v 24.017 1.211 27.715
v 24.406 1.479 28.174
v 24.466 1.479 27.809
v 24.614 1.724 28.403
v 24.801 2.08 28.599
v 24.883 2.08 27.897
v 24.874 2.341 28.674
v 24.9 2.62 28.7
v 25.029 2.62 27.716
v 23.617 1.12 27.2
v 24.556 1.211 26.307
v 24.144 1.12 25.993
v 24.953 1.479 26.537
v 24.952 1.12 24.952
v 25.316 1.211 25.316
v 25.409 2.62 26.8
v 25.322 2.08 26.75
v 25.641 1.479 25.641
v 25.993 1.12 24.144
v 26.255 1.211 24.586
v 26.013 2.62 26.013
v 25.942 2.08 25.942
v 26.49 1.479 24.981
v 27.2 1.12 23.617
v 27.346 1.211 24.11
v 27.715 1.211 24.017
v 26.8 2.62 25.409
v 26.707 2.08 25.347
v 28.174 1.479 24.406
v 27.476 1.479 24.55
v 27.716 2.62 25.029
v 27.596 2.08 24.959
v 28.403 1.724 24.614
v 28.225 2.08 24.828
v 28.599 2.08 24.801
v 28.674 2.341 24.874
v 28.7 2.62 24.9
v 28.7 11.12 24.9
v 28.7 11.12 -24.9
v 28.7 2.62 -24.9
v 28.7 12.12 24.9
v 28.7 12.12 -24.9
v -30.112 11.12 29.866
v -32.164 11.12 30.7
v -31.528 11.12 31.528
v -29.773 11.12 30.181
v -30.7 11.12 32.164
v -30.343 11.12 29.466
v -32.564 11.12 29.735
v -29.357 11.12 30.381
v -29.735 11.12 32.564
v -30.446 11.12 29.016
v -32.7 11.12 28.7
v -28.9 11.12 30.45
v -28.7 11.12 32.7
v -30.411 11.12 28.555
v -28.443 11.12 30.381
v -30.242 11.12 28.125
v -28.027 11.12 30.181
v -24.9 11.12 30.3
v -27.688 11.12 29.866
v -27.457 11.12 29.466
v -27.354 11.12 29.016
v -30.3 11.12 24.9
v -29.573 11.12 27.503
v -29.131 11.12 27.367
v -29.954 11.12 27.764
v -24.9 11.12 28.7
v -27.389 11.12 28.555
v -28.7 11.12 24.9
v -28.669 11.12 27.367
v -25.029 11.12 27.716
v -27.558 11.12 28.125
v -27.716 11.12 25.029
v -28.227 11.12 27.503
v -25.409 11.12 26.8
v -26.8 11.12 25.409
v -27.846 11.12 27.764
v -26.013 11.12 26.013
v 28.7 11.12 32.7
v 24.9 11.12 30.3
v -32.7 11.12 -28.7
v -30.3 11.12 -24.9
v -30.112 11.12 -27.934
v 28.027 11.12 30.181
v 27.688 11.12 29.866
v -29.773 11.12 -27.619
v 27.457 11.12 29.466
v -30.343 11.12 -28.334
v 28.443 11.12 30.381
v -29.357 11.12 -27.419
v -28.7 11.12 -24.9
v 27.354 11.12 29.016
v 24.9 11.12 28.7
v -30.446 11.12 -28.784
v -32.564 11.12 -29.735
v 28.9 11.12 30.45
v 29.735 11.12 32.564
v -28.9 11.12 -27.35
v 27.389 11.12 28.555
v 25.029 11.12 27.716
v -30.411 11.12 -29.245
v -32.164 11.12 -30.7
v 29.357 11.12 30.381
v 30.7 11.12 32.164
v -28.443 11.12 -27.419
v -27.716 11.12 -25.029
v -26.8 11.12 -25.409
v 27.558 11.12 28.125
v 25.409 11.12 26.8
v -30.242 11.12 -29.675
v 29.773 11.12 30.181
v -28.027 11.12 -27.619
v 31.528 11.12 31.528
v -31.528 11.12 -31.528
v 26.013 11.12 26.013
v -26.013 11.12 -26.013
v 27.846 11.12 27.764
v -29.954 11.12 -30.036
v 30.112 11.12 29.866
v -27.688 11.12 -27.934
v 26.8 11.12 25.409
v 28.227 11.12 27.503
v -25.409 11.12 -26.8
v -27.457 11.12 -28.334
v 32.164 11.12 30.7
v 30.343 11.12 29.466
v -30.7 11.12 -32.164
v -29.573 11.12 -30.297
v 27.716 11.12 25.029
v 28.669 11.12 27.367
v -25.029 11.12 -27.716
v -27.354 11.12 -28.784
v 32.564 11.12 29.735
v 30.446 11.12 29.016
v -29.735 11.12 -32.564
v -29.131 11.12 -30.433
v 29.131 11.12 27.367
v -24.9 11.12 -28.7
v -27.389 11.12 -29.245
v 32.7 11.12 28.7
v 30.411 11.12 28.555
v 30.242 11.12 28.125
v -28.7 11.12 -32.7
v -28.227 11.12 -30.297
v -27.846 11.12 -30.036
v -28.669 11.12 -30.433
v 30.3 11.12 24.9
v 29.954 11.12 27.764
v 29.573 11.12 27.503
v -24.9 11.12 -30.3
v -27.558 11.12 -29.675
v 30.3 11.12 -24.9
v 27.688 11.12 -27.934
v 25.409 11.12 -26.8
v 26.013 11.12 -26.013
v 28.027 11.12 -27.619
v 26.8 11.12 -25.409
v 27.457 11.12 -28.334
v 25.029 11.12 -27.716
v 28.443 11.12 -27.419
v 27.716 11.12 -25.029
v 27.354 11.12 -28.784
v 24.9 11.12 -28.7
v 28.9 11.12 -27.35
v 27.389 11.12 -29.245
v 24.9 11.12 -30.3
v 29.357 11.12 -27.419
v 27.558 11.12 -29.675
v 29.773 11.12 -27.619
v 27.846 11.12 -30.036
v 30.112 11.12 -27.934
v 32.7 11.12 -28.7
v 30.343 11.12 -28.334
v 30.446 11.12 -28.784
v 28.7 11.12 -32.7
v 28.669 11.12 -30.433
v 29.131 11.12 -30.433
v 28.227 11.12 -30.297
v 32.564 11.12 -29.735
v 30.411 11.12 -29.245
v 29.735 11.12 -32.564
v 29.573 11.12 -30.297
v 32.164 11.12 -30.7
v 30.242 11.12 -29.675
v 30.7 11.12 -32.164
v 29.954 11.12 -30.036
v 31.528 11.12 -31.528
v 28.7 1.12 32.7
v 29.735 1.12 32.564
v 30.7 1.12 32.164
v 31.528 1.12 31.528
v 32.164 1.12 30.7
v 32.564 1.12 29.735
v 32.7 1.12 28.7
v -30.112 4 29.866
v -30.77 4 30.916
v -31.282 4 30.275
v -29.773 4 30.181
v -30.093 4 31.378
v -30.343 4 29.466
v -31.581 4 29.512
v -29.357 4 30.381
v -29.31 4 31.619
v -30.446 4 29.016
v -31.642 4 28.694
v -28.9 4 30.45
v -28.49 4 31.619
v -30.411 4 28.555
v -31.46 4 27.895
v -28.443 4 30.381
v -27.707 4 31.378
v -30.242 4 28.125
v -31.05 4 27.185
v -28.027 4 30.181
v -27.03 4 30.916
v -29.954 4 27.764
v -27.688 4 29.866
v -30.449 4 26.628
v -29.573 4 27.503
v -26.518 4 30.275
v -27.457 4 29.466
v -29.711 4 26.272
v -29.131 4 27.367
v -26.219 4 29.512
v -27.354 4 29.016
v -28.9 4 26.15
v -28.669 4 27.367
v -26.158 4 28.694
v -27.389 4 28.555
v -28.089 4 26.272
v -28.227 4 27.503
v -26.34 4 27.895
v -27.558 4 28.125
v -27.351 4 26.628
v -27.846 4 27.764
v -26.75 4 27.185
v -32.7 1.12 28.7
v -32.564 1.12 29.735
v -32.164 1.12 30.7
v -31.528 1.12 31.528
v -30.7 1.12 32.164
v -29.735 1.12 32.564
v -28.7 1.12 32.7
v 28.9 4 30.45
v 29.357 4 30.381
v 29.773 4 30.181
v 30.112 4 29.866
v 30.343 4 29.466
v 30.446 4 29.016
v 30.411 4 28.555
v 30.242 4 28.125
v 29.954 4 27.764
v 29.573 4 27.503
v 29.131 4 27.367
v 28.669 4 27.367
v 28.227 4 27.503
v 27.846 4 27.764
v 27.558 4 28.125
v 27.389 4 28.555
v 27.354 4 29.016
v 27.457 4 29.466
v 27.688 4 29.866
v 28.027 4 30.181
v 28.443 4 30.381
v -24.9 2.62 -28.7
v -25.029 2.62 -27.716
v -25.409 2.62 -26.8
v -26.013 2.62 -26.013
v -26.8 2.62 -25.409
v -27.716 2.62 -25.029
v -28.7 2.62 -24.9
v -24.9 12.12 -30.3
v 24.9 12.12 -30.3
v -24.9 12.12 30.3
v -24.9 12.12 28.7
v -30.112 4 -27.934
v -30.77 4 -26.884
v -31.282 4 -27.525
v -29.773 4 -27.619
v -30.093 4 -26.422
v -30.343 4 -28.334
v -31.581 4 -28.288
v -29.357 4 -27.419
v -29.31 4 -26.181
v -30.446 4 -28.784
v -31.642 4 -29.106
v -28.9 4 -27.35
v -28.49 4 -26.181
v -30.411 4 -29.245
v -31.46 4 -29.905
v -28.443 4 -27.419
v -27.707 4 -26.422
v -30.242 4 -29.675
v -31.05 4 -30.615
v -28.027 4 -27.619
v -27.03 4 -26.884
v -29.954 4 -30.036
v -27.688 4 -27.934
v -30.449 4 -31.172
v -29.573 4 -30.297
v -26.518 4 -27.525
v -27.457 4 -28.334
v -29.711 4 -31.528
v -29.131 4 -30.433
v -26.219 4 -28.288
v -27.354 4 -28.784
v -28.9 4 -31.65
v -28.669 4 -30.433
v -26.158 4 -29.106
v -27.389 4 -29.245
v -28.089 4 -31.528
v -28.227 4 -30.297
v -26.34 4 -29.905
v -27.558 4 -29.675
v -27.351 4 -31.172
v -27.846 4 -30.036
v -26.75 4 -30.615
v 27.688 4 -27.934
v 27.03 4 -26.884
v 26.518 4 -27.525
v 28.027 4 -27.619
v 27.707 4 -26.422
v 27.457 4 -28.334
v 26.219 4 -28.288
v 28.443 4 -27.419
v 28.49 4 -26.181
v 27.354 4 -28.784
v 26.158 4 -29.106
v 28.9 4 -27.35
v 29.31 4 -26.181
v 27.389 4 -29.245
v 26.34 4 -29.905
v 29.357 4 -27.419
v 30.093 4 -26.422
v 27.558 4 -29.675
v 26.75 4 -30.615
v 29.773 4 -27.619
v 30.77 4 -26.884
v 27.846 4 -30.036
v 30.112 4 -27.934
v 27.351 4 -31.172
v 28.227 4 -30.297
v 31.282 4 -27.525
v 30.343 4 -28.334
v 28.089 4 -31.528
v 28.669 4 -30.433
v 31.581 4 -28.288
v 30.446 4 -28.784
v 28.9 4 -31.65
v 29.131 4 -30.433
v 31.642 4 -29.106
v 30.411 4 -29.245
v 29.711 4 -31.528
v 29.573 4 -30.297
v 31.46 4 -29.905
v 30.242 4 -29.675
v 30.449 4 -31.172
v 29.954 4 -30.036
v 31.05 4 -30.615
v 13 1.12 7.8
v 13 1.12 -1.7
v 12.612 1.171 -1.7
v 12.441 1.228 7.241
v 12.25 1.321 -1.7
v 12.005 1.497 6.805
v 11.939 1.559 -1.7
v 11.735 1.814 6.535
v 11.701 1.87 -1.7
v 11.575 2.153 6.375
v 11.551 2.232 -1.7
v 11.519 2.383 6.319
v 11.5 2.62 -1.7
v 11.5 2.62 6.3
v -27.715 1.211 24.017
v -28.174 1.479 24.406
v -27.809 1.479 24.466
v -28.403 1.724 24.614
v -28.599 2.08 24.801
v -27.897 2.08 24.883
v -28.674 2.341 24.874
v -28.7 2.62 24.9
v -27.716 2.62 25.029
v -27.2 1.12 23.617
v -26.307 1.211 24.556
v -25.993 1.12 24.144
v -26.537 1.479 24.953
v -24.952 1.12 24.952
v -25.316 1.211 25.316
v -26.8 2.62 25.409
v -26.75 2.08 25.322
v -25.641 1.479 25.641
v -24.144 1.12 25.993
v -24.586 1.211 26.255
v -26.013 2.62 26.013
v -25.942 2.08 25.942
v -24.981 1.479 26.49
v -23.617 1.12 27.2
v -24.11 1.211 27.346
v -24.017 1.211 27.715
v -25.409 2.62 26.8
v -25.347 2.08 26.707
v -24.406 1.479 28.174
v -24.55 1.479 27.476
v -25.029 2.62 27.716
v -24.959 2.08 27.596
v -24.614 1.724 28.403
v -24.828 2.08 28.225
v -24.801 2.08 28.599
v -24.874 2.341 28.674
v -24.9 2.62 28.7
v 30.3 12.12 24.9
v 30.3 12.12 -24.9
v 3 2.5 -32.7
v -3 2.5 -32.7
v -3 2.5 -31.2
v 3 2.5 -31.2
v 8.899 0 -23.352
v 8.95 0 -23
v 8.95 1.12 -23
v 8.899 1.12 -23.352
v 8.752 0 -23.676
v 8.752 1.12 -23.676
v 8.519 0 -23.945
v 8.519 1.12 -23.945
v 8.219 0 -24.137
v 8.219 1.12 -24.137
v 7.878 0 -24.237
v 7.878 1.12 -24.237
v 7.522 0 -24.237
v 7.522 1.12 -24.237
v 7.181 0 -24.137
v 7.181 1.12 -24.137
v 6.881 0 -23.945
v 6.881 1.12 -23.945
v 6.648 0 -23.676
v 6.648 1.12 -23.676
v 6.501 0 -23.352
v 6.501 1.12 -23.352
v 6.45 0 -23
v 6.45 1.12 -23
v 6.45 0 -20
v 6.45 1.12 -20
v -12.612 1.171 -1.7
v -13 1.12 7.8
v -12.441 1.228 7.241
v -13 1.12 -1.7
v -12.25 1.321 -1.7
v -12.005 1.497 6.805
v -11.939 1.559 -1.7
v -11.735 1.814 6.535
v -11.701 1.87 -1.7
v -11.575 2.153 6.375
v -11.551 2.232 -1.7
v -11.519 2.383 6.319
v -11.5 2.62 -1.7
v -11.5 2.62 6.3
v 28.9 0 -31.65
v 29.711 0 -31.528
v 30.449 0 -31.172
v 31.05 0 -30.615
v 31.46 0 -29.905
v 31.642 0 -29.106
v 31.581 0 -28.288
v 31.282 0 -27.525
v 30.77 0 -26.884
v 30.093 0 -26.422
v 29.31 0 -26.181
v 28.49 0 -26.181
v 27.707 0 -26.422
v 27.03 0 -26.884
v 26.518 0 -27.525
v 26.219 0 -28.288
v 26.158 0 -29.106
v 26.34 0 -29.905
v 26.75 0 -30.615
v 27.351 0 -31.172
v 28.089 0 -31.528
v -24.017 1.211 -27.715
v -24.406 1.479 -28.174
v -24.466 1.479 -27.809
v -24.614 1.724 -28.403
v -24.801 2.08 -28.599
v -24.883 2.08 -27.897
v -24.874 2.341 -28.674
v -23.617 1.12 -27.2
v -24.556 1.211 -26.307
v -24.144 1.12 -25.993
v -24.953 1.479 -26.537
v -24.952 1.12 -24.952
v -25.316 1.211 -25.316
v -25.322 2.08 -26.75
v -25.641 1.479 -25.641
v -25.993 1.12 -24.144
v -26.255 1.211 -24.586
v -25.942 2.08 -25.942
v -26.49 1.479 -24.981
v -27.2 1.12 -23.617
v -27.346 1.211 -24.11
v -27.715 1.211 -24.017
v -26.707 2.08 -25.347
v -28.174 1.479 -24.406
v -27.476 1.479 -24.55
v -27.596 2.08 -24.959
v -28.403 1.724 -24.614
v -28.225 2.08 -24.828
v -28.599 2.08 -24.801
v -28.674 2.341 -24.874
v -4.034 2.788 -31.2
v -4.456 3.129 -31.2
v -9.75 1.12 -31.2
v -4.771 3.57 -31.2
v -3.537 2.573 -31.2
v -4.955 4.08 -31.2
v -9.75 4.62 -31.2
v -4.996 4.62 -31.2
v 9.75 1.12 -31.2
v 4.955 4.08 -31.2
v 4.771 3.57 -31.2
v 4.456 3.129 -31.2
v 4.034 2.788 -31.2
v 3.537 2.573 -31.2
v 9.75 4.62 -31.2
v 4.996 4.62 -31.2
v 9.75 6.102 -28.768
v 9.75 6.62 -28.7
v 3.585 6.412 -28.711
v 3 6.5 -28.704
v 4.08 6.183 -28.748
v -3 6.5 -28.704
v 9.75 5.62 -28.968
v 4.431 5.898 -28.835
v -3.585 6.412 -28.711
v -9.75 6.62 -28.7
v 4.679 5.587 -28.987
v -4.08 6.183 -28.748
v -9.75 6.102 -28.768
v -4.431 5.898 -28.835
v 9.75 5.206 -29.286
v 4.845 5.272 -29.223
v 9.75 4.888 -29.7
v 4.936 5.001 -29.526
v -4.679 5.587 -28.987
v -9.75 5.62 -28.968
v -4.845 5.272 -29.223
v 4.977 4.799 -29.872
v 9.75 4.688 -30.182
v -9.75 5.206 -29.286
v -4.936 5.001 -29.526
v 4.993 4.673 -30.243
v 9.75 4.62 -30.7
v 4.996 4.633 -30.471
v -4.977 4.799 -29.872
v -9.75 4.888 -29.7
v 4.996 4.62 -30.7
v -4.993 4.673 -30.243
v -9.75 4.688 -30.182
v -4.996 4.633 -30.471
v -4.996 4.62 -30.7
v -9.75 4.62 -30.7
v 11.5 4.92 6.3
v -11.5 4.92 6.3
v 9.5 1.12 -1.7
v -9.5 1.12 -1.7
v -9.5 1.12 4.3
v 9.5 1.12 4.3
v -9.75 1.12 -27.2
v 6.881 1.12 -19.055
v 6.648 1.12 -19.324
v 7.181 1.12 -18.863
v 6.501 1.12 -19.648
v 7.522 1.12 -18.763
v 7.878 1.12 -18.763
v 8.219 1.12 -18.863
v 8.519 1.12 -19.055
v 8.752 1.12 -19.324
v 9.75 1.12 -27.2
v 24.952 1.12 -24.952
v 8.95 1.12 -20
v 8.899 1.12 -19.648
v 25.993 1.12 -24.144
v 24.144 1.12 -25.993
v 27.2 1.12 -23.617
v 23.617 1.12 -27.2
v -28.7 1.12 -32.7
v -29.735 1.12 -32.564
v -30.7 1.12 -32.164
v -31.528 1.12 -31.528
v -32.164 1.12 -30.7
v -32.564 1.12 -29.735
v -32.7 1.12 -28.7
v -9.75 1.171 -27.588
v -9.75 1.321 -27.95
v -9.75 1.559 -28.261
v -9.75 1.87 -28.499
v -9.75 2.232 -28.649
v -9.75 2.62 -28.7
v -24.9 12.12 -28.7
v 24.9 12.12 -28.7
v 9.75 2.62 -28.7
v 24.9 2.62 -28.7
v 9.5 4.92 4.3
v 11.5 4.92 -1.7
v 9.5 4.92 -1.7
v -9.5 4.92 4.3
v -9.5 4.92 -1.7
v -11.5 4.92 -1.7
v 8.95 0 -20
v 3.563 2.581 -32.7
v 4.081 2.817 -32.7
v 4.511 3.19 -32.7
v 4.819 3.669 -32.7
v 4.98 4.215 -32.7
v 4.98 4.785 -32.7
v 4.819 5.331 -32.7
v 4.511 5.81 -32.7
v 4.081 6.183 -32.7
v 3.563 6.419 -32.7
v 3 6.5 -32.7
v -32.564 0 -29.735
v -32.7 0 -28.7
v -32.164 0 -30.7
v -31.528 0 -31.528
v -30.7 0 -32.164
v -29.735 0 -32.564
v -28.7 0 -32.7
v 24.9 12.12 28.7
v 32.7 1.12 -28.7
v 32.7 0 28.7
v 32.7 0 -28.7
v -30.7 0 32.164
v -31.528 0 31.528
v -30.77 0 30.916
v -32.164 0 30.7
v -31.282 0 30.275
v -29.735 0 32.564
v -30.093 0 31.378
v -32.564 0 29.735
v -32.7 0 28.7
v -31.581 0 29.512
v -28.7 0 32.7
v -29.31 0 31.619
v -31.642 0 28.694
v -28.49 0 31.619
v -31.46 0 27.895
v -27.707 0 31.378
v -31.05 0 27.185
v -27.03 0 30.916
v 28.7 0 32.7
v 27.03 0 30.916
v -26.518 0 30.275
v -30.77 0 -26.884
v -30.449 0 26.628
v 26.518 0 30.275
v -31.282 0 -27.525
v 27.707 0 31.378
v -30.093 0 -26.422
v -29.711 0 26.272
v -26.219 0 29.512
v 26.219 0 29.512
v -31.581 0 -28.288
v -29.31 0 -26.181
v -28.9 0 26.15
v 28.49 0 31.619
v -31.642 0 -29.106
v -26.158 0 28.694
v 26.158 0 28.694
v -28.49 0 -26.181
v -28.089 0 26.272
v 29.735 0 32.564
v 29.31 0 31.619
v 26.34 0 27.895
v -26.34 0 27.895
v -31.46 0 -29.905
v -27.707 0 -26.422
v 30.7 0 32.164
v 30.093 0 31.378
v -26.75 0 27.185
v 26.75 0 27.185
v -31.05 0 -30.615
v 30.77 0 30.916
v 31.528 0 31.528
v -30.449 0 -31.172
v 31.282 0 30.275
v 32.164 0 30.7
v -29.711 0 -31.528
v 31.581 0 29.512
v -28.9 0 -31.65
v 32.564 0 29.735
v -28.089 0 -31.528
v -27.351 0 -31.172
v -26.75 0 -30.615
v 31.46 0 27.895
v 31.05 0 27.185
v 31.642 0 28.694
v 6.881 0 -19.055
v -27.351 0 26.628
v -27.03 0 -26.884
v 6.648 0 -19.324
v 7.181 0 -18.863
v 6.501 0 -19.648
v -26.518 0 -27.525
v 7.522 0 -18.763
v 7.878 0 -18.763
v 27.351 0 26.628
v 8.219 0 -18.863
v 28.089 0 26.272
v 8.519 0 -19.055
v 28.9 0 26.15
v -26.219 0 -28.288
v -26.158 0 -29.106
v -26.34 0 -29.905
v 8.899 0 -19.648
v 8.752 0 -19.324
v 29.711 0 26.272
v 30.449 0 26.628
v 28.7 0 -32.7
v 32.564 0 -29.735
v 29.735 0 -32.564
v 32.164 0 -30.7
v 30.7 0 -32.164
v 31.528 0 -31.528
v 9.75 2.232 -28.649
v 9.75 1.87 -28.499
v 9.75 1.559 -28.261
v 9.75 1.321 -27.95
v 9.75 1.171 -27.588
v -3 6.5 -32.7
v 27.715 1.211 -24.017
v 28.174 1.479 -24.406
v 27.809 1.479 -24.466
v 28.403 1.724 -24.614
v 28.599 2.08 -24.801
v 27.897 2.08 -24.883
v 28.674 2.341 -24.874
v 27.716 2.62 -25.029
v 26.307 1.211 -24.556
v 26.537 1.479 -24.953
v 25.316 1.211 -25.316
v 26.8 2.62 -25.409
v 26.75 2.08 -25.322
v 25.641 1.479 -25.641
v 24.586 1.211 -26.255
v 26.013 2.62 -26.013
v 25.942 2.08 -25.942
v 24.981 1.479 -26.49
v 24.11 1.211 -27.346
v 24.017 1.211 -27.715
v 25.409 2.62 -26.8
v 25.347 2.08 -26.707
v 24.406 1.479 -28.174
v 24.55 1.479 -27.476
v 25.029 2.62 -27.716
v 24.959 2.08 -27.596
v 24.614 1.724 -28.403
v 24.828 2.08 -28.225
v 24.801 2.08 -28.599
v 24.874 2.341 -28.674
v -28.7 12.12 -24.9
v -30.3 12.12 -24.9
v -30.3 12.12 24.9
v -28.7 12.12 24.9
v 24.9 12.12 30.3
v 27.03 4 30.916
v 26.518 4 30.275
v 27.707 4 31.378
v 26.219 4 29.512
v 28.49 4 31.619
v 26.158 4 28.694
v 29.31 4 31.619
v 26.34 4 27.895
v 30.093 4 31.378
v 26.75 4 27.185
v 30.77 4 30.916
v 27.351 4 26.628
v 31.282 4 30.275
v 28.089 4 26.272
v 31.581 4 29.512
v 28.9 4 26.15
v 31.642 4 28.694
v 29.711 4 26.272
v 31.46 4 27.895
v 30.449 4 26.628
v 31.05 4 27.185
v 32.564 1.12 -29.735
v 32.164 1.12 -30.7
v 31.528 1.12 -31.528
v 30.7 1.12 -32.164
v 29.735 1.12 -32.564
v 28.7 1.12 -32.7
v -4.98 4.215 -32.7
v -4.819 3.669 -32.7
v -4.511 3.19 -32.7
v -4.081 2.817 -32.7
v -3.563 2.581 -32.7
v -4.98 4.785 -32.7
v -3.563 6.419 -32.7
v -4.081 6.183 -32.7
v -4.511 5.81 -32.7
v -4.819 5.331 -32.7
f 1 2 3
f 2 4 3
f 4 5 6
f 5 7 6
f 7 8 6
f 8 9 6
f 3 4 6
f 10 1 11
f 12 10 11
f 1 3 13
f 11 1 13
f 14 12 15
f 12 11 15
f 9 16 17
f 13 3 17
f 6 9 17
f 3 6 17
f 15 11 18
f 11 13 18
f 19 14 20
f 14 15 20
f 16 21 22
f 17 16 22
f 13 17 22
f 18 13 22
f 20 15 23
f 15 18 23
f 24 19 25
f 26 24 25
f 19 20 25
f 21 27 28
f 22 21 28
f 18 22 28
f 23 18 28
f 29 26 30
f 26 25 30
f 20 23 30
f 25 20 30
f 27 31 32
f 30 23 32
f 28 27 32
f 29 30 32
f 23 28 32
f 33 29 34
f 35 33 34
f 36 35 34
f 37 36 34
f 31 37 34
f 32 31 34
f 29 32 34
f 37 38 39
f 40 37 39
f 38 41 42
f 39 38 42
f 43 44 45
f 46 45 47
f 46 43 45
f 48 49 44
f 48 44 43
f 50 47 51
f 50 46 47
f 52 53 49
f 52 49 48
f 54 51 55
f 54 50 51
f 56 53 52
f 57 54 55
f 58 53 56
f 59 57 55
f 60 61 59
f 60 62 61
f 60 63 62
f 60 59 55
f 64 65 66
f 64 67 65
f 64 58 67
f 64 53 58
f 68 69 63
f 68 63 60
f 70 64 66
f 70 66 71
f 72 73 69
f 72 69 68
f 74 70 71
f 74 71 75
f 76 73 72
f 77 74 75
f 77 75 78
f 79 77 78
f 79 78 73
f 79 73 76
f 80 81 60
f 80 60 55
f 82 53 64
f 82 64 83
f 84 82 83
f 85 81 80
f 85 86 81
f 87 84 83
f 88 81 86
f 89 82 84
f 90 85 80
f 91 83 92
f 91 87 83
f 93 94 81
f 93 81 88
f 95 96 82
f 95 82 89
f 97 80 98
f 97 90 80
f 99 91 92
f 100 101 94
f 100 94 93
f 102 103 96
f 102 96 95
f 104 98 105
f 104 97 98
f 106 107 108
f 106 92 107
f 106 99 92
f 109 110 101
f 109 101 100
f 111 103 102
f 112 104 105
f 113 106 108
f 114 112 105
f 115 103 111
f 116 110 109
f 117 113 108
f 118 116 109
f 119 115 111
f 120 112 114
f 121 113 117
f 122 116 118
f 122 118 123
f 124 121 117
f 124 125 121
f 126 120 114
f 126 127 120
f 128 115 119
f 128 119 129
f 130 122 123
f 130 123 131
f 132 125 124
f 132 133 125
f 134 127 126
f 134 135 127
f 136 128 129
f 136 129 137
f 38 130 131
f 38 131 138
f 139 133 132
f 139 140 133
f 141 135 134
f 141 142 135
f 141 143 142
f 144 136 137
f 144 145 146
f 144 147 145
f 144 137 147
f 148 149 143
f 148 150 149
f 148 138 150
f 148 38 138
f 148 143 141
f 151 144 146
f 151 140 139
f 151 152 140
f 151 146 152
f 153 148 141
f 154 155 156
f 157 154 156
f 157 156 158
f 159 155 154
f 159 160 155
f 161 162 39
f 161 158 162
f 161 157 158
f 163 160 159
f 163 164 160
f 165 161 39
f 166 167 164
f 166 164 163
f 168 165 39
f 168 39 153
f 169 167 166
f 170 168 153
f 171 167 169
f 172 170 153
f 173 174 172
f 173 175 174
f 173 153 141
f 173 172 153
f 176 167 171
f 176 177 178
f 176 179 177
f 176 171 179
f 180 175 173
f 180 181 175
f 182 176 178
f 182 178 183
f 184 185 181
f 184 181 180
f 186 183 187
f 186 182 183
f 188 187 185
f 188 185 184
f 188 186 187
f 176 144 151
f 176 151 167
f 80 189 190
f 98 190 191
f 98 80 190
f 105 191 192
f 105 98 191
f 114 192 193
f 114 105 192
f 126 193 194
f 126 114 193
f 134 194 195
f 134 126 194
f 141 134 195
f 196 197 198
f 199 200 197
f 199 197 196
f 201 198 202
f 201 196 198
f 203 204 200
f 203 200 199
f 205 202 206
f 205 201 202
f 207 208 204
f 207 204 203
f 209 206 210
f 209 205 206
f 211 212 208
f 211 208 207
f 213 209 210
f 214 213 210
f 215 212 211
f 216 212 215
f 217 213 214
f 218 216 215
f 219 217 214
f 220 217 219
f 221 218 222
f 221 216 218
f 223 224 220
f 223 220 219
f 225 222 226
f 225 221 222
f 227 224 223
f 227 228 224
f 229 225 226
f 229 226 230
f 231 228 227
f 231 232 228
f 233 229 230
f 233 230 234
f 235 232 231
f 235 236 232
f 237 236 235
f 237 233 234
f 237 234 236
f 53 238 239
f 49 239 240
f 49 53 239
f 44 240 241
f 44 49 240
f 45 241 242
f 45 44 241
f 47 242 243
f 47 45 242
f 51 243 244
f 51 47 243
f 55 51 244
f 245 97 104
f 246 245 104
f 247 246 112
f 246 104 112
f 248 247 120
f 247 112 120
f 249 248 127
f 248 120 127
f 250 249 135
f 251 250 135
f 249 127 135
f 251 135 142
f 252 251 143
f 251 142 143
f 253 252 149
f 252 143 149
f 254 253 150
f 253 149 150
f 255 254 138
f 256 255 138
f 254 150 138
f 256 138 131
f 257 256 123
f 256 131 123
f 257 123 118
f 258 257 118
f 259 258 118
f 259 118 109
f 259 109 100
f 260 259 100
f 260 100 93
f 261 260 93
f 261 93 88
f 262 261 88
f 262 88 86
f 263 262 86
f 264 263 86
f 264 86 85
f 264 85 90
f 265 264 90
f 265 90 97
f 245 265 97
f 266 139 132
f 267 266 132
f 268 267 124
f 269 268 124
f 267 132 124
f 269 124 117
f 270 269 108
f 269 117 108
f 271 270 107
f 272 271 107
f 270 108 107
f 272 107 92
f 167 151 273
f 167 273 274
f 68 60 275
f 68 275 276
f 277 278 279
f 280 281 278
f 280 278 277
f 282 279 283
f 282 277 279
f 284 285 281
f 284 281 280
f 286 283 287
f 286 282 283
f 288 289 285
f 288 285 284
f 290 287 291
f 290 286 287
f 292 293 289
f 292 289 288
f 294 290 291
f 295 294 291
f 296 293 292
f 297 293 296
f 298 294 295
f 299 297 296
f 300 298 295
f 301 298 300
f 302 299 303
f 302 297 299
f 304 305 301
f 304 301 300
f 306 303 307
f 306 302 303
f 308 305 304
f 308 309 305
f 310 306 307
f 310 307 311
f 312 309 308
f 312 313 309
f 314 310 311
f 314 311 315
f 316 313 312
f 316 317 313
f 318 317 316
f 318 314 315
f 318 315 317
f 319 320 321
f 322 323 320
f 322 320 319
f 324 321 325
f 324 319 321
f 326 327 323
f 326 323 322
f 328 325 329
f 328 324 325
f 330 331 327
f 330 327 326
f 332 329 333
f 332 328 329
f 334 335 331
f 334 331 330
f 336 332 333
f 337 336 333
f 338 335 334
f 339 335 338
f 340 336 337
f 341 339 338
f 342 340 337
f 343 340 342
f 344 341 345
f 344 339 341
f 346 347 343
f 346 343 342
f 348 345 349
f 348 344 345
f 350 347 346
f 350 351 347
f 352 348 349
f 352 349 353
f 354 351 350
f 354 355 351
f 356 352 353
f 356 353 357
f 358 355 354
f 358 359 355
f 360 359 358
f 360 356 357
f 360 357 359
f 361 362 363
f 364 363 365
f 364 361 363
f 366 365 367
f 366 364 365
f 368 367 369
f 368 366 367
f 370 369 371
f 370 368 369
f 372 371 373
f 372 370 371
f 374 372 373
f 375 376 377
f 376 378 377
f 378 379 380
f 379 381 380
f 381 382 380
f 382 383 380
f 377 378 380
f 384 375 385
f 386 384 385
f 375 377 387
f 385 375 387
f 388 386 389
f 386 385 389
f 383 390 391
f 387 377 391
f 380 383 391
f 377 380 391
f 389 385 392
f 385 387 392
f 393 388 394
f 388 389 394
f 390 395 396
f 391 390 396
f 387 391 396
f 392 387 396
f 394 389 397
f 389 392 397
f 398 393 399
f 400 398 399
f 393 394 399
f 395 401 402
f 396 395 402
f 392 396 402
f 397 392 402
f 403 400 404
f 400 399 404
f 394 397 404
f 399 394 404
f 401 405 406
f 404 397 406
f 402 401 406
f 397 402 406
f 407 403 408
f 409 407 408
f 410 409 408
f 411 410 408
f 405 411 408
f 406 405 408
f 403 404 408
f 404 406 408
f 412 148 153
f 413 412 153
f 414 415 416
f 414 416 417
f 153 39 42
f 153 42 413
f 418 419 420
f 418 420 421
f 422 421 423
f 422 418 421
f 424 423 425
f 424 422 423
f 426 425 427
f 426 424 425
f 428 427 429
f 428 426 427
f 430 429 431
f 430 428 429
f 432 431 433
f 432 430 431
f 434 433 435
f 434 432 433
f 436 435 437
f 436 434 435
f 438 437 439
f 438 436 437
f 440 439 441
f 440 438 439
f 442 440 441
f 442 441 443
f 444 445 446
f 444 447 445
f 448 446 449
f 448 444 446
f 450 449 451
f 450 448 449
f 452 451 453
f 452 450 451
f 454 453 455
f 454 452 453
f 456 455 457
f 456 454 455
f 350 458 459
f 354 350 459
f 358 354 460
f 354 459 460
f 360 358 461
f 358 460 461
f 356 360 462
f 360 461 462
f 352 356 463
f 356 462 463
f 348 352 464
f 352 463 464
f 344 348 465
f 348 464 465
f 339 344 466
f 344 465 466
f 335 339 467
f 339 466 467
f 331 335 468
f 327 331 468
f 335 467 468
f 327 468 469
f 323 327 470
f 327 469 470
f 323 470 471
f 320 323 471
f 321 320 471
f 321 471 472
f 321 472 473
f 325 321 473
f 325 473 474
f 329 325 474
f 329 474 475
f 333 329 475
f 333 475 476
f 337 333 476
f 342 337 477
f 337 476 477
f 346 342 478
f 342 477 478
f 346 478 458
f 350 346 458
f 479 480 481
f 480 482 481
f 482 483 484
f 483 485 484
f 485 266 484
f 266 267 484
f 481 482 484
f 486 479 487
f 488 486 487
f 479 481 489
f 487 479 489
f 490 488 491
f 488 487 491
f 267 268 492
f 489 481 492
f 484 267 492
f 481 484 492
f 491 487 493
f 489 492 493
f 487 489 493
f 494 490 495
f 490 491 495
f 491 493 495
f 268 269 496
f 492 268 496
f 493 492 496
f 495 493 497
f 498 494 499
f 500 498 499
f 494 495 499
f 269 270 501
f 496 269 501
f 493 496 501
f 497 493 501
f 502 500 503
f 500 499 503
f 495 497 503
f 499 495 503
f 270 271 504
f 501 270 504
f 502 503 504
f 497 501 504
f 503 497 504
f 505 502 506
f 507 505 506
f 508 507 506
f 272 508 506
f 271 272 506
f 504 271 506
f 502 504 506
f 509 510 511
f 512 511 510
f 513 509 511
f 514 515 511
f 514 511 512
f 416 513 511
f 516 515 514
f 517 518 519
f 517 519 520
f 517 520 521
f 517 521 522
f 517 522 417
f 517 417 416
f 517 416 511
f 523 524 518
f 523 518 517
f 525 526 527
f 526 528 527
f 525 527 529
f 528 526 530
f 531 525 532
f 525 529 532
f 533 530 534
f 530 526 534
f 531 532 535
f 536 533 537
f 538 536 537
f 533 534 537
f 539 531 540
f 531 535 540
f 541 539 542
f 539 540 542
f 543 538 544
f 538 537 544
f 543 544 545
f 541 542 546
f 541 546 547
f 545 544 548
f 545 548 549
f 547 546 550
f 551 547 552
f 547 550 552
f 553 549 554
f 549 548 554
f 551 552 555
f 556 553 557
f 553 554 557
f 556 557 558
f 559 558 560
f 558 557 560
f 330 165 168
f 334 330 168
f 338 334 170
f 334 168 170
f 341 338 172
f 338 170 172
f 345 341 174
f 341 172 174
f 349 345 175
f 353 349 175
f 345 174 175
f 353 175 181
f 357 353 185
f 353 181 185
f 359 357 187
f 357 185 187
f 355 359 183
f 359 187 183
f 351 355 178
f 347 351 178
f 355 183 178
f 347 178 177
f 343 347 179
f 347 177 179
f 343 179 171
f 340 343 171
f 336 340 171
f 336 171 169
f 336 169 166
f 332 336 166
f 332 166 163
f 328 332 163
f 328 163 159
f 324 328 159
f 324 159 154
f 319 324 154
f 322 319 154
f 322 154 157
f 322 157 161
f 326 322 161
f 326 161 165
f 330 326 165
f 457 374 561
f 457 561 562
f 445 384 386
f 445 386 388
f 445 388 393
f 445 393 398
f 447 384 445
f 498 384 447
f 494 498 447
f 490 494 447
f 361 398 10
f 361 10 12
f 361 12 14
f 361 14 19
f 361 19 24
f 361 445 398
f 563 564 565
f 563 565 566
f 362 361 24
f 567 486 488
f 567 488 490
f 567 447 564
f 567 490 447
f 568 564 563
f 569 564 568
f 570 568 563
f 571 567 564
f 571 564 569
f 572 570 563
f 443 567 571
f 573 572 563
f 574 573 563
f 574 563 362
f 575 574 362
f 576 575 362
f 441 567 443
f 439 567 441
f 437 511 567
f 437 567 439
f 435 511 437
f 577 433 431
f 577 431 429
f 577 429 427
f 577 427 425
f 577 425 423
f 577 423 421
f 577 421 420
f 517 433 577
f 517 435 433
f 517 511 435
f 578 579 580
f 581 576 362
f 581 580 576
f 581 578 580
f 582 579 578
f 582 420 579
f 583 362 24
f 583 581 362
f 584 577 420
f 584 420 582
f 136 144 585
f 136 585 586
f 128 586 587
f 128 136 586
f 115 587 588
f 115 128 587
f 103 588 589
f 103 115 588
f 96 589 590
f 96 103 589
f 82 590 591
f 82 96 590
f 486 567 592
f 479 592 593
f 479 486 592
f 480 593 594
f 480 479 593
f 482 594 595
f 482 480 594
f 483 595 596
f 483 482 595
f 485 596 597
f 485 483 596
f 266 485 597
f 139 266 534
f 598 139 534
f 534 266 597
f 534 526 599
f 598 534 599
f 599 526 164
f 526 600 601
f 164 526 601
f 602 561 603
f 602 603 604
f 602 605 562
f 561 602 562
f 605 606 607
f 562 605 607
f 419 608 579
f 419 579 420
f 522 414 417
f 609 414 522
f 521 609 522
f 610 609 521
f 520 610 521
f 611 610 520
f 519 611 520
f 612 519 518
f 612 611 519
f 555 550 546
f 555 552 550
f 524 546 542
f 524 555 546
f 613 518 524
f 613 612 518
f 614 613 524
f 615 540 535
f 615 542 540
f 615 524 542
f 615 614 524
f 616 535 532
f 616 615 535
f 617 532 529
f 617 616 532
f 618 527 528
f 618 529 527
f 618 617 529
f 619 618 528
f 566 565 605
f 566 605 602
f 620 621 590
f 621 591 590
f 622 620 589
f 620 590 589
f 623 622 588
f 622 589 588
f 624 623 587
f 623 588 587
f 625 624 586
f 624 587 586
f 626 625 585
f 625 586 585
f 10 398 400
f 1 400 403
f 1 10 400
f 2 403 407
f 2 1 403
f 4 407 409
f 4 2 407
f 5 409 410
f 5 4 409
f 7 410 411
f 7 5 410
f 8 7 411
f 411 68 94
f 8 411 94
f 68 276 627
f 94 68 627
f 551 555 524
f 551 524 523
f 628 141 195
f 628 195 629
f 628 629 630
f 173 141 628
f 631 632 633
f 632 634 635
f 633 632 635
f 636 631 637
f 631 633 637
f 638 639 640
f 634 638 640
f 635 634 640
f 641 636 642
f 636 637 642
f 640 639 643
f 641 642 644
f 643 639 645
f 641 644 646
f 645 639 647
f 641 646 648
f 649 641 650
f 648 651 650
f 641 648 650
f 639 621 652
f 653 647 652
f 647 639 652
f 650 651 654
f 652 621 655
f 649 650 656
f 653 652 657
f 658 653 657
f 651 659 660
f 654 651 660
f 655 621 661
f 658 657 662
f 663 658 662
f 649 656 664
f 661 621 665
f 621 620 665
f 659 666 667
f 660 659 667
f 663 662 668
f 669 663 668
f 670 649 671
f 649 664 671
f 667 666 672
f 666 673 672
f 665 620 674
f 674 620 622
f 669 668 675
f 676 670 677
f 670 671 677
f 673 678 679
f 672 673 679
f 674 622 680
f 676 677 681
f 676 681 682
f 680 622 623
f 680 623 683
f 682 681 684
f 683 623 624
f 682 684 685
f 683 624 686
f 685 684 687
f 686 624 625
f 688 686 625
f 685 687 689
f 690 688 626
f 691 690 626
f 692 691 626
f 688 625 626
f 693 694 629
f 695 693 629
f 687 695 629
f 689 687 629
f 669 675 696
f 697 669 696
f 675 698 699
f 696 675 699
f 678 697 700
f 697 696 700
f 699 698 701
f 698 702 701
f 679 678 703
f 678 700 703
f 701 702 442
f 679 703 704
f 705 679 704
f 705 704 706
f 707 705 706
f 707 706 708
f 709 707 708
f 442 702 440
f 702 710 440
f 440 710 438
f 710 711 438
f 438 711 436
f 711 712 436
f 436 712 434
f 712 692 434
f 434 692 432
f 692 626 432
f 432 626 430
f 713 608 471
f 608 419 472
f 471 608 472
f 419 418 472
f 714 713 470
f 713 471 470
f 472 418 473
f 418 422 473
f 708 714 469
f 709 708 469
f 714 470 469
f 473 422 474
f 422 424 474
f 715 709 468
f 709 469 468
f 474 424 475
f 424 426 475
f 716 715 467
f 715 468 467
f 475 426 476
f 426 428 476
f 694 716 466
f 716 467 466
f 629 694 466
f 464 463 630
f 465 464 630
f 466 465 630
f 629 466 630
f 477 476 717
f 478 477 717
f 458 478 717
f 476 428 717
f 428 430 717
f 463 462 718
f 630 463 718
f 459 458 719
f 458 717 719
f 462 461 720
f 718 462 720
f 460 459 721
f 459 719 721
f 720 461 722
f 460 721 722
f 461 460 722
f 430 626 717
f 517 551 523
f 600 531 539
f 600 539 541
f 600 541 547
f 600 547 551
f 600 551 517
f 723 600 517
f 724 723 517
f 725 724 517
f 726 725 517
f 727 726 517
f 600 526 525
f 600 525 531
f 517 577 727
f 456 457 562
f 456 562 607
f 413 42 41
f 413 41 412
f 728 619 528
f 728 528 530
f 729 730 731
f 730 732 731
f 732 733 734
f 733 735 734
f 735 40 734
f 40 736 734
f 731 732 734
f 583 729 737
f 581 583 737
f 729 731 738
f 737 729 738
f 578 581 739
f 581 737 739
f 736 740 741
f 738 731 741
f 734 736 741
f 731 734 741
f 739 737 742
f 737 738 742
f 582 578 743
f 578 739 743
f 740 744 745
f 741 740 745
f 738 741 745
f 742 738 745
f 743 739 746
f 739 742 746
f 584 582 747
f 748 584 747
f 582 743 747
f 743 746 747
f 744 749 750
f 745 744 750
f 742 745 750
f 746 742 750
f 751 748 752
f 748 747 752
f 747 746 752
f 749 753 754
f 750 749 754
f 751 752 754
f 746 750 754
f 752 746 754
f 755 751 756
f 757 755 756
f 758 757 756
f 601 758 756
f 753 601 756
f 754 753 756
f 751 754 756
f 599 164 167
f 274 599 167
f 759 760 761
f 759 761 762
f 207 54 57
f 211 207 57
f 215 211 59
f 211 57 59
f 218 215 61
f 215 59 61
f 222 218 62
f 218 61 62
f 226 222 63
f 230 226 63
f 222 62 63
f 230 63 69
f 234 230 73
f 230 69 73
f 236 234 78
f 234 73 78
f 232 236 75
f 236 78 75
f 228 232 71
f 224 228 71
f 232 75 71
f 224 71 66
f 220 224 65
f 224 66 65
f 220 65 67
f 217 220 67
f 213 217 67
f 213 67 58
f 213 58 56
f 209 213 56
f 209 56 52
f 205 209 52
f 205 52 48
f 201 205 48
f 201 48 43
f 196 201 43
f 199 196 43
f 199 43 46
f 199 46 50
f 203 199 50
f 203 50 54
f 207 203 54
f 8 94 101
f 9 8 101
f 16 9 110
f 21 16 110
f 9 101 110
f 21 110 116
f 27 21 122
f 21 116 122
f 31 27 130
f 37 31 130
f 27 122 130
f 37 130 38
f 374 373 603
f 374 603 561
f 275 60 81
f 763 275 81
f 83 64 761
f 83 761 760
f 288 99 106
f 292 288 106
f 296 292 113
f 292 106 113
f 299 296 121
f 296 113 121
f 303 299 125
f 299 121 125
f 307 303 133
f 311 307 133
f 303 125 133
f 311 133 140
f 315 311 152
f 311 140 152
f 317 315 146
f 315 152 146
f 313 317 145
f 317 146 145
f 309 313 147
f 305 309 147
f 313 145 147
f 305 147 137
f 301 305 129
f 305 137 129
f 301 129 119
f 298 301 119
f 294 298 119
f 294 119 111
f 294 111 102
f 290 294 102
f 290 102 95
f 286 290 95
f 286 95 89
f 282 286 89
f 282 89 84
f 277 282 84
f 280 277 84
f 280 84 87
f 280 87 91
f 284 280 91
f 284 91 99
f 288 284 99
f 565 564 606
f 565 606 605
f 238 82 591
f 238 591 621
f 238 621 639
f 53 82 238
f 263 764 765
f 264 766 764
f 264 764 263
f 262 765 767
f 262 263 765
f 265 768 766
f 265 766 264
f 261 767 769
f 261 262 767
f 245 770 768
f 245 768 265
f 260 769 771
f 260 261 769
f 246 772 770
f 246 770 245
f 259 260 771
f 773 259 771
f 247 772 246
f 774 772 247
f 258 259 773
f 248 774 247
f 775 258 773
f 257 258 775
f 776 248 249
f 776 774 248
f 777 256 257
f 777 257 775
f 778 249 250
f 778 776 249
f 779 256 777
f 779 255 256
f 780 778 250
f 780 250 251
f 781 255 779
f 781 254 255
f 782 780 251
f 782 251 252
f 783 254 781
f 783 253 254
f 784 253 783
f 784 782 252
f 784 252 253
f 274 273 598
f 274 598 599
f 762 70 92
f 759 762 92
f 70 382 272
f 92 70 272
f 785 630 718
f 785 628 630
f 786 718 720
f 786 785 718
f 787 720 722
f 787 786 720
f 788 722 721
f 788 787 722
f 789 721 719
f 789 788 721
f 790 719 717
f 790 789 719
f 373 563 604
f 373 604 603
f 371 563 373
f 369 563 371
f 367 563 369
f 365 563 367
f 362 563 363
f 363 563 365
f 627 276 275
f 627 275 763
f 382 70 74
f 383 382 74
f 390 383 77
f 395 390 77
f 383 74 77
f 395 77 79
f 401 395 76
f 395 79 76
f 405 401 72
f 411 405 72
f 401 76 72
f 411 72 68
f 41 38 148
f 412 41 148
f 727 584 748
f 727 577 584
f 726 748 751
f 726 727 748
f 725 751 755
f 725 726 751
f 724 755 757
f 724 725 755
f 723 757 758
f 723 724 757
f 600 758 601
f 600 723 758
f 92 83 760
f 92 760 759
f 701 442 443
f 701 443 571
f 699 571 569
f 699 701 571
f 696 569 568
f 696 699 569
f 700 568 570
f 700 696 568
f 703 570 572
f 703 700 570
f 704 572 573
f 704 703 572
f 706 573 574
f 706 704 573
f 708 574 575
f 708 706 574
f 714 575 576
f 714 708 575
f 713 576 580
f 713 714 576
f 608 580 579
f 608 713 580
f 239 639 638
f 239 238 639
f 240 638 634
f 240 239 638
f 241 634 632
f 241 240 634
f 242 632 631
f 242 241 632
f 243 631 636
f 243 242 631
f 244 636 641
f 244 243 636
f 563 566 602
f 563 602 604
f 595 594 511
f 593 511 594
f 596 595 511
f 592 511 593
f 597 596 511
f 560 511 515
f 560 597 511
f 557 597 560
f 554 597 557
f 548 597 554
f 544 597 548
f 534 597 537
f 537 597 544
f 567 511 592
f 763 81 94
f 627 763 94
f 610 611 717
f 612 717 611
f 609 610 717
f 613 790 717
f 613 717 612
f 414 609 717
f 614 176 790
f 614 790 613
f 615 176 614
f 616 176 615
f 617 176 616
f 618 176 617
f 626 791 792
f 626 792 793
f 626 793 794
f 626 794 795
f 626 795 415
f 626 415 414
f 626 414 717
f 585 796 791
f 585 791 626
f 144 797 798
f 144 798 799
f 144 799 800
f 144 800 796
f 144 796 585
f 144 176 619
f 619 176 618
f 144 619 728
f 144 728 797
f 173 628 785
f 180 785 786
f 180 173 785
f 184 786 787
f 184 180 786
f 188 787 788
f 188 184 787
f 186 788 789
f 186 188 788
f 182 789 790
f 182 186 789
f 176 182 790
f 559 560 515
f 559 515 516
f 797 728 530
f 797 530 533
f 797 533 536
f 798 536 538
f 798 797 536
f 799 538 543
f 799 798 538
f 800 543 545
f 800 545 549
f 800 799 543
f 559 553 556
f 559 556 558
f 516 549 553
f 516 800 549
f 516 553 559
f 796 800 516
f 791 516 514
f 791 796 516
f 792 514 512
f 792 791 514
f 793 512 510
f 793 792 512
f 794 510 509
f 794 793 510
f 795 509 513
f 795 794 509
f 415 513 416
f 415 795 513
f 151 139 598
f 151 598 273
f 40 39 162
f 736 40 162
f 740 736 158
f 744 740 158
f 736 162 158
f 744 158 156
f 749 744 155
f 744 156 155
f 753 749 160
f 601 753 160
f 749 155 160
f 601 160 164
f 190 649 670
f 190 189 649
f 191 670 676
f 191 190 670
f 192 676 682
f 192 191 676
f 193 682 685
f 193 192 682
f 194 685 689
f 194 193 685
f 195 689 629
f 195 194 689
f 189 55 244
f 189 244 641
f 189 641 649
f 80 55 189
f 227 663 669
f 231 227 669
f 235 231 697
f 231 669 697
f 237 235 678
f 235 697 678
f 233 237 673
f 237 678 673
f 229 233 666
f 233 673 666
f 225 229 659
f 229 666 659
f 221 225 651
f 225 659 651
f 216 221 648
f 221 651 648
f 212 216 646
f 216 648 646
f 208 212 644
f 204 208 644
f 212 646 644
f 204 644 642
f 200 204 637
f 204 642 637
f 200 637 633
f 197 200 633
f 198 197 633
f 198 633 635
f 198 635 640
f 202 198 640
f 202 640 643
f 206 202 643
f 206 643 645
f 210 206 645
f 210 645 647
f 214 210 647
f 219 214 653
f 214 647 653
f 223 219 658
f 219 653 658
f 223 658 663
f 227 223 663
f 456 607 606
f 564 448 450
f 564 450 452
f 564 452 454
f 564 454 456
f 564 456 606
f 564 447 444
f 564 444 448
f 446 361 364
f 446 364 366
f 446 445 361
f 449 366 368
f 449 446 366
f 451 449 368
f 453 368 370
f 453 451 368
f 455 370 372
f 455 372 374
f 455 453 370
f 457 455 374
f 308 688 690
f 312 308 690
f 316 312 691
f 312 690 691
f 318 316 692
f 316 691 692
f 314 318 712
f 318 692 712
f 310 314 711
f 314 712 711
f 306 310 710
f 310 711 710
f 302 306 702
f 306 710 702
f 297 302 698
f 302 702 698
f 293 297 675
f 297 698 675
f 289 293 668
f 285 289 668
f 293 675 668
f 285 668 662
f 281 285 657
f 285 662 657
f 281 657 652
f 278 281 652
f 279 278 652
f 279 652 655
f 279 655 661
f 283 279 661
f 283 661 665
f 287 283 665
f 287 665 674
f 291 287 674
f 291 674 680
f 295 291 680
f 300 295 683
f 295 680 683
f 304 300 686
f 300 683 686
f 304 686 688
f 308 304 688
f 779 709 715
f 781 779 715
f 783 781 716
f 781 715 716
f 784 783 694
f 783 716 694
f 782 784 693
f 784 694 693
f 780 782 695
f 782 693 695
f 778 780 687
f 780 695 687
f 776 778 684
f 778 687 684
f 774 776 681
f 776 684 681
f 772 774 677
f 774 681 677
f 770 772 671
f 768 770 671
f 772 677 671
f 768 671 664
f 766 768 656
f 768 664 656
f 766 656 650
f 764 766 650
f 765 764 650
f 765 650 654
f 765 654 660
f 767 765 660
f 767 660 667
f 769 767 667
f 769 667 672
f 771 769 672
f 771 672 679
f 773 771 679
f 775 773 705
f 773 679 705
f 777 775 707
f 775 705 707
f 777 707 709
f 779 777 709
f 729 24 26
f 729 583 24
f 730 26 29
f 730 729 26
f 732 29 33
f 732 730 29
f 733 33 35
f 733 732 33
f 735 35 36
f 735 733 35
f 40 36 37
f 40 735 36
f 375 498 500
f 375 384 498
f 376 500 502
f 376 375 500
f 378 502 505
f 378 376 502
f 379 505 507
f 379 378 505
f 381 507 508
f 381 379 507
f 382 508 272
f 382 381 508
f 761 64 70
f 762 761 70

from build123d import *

# Parameters (mm, degrees)
SKETCH1_W           = 65.4
SKETCH1_H           = 65.4
BOSS_EXTRUDE1_DEPTH = 1.12
FILLET1_R           = 4
BOSS_EXTRUDE2_START = 10
BOSS_EXTRUDE2_DEPTH = 10
CUT_EXTRUDE1_REACH  = 75.96
SKETCH4_W           = 19.5
SKETCH4_H           = 3.5
CUT_EXTRUDE2_DEPTH  = 2.5
FILLET3_R           = 2
SKETCH5_W           = 1.6
SKETCH5_H           = 49.8
SKETCH5_W_2         = 49.8
SKETCH5_H_2         = 1.6
BOSS_EXTRUDE3_DEPTH = 1
BOSS_EXTRUDE4_DEPTH = 3.8
SKETCH7_R           = 1.55
CUT_EXTRUDE3_DEPTH  = 11.12
SKETCH8_R           = 2.75
CUT_EXTRUDE4_DEPTH  = 4
FILLET4_R           = 1.5
FILLET5_R           = 1.5
CUT_EXTRUDE5_REACH  = 49.807


with BuildPart() as part:
    # Sketch1 → Boss-Extrude1 (new body)
    with BuildSketch(Plane(origin=(0, 0, 0), x_dir=(1, 0, 0), z_dir=(0, 1, 0))):
        Rectangle(SKETCH1_W, SKETCH1_H)
    extrude(amount=BOSS_EXTRUDE1_DEPTH)

    # Fillet1
    fillet1_edges = [part.edges().sort_by_distance(p)[0] for p in [
        (32.7, 0.56, 32.7),
        (-32.7, 0.56, 32.7),
        (-32.7, 0.56, -32.7),
        (32.7, 0.56, -32.7),
    ]]
    fillet(fillet1_edges, radius=FILLET1_R)

    # Sketch2 → Boss-Extrude2 (add)
    with BuildSketch(Plane(origin=(0, 1.12, 0), x_dir=(1, 0, 0), z_dir=(0, 1, 0)).offset(BOSS_EXTRUDE2_START)):
        with BuildLine():
            Line((-32.7, 28.7), (-32.7, -28.7))
            ThreePointArc((-32.7, -28.7), (-31.528427125, -31.528427125), (-28.7, -32.7))
            Line((-28.7, -32.7), (28.7, -32.7))
            ThreePointArc((28.7, -32.7), (31.528427125, -31.528427125), (32.7, -28.7))
            Line((32.7, -28.7), (32.7, 28.7))
            ThreePointArc((32.7, 28.7), (31.528427125, 31.528427125), (28.7, 32.7))
            Line((28.7, 32.7), (-28.7, 32.7))
            ThreePointArc((-28.7, 32.7), (-31.528427125, 31.528427125), (-32.7, 28.7))
        make_face()
        with BuildLine():
            Line((24.9, 28.7), (-24.9, 28.7))
            ThreePointArc((-24.9, 28.7), (-26.012994231, 26.012994231), (-28.7, 24.9))
            Line((-28.7, 24.9), (-28.7, -24.9))
            ThreePointArc((-28.7, -24.9), (-26.012994231, -26.012994231), (-24.9, -28.7))
            Line((-24.9, -28.7), (24.9, -28.7))
            ThreePointArc((24.9, -28.7), (26.012994231, -26.012994231), (28.7, -24.9))
            Line((28.7, -24.9), (28.7, 24.9))
            ThreePointArc((28.7, 24.9), (26.012994231, 26.012994231), (24.9, 28.7))
        make_face(mode=Mode.SUBTRACT)
    extrude(amount=-BOSS_EXTRUDE2_DEPTH)

    # Sketch3 → Cut-Extrude1 (cut, up to next)
    with BuildSketch(Plane(origin=(0, 0, -32.7), x_dir=(-1, 0, 0), z_dir=(0, 0, -1)), mode=Mode.PRIVATE) as cut_extrude1_sk1:
        with BuildLine():
            Line((-3, 6.5), (3, 6.5))
            ThreePointArc((3, 6.5), (5, 4.5), (3, 2.5))
            Line((3, 2.5), (-3, 2.5))
            ThreePointArc((-3, 2.5), (-5, 4.5), (-3, 6.5))
        make_face()
    cut_extrude1_tool1 = extrude(cut_extrude1_sk1.sketch, amount=-CUT_EXTRUDE1_REACH, mode=Mode.PRIVATE) & part.part
    add(cut_extrude1_tool1.solids().sort_by_distance((0, 4.5, -32.7))[0], mode=Mode.SUBTRACT)

    # Sketch4 → Cut-Extrude2 (cut)
    with BuildSketch(Plane.XY.offset(-28.7)):
        with Locations((0, 2.87)):
            Rectangle(SKETCH4_W, SKETCH4_H)
    extrude(amount=-CUT_EXTRUDE2_DEPTH, mode=Mode.SUBTRACT)

    # Fillet3
    # the kernel refuses this fillet: 2 mm, written as the material it takes off along each edge
    with BuildSketch(Plane(origin=(-0.003603246, 4.62, -28.7), x_dir=(0, 1, 0), z_dir=(1, 0, 0)), Plane(origin=(-9.75, 4.62, -28.7), x_dir=(0, 1, 0), z_dir=(1, 0, 0))) as fillet3_piece_1:
        with BuildLine():
            CenterArc((FILLET3_R, -FILLET3_R), FILLET3_R, 90, 90)
            Line((0, -FILLET3_R), (0, 0))
            Line((0, 0), (FILLET3_R, 0))
        make_face()
    extrude(amount=9.753603246, mode=Mode.SUBTRACT)

    # Sketch5 → Boss-Extrude3 (add)
    with BuildSketch(Plane(origin=(0, 11.12, 0), x_dir=(1, 0, 0), z_dir=(0, 1, 0))):
        with Locations((-29.5, 0)):
            Rectangle(SKETCH5_W, SKETCH5_H)
        with Locations((0, -29.5)):
            Rectangle(SKETCH5_W_2, SKETCH5_H_2)
        with Locations((29.5, 0)):
            Rectangle(SKETCH5_W, SKETCH5_H)
        with Locations((0, 29.5)):
            Rectangle(SKETCH5_W_2, SKETCH5_H_2)
    extrude(amount=BOSS_EXTRUDE3_DEPTH)

    # Sketch6 → Boss-Extrude4 (add)
    with BuildSketch(Plane(origin=(0, 1.12, 0), x_dir=(1, 0, 0), z_dir=(0, 1, 0))):
        Polygon((-9.5, -4.3), (9.5, -4.3), (9.5, 1.7), (11.5, 1.7), (11.5, -6.3), (-11.5, -6.3), (-11.5, 1.7), (-9.5, 1.7), align=None)
    extrude(amount=BOSS_EXTRUDE4_DEPTH)

    # Sketch7 → Cut-Extrude3 (cut)
    with BuildSketch(Plane(origin=(0, 11.12, 0), x_dir=(1, 0, 0), z_dir=(0, 1, 0))):
        with Locations(Location((-28.9, 28.9, 0), (0, 0, 270))):
            Circle(SKETCH7_R)
        with Locations(Location((28.9, 28.9, 0), (0, 0, 270))):
            Circle(SKETCH7_R)
        with Locations(Location((28.9, -28.9, 0), (0, 0, 270))):
            Circle(SKETCH7_R)
        with Locations(Location((-28.9, -28.9, 0), (0, 0, 270))):
            Circle(SKETCH7_R)
    extrude(amount=-CUT_EXTRUDE3_DEPTH, mode=Mode.SUBTRACT)

    # Sketch8 → Cut-Extrude4 (cut)
    with BuildSketch(Plane.XZ):
        with Locations(Location((-28.9, 28.9, 0), (0, 0, 270))):
            Circle(SKETCH8_R)
        with Locations(Location((28.9, 28.9, 0), (0, 0, 270))):
            Circle(SKETCH8_R)
        with Locations(Location((28.9, -28.9, 0), (0, 0, 270))):
            Circle(SKETCH8_R)
        with Locations(Location((-28.9, -28.9, 0), (0, 0, 270))):
            Circle(SKETCH8_R)
    extrude(amount=-CUT_EXTRUDE4_DEPTH, mode=Mode.SUBTRACT)

    # Fillet4
    fillet4_edges = [part.edges().sort_by_distance(p)[0] for p in [
        (-11.5, 1.12, 2.3),
        (0, 1.12, 6.3),
        (11.5, 1.12, 2.3),
    ]]
    fillet(fillet4_edges, radius=FILLET4_R)

    # Fillet5
    fillet5_edges = [part.edges().sort_by_distance(p)[0] for p in [
        (-17.325, 1.12, -28.7),
        (26.012994231, 1.12, -26.012994231),
        (17.325, 1.12, -28.7),
        (-26.012994231, 1.12, -26.012994231),
        (-28.7, 1.12, 0),
        (-26.012994231, 1.12, 26.012994231),
        (0, 1.12, 28.7),
        (26.012994231, 1.12, 26.012994231),
        (28.7, 1.12, 0),
    ]]
    fillet(fillet5_edges, radius=FILLET5_R)

    # Sketch9 → Cut-Extrude5 (cut, up to next)
    with BuildSketch(Plane.XZ, mode=Mode.PRIVATE) as cut_extrude5_sk1:
        with BuildLine():
            Line((6.45, -23), (6.45, -20))
            ThreePointArc((6.45, -20), (7.7, -18.75), (8.95, -20))
            Line((8.95, -20), (8.95, -23))
            ThreePointArc((8.95, -23), (7.7, -24.25), (6.45, -23))
        make_face()
    cut_extrude5_tool1 = extrude(cut_extrude5_sk1.sketch, amount=-CUT_EXTRUDE5_REACH, mode=Mode.PRIVATE) & part.part
    add(cut_extrude5_tool1.solids().sort_by_distance((7.7, 0, -21.5))[0], mode=Mode.SUBTRACT)


solid = part.part
